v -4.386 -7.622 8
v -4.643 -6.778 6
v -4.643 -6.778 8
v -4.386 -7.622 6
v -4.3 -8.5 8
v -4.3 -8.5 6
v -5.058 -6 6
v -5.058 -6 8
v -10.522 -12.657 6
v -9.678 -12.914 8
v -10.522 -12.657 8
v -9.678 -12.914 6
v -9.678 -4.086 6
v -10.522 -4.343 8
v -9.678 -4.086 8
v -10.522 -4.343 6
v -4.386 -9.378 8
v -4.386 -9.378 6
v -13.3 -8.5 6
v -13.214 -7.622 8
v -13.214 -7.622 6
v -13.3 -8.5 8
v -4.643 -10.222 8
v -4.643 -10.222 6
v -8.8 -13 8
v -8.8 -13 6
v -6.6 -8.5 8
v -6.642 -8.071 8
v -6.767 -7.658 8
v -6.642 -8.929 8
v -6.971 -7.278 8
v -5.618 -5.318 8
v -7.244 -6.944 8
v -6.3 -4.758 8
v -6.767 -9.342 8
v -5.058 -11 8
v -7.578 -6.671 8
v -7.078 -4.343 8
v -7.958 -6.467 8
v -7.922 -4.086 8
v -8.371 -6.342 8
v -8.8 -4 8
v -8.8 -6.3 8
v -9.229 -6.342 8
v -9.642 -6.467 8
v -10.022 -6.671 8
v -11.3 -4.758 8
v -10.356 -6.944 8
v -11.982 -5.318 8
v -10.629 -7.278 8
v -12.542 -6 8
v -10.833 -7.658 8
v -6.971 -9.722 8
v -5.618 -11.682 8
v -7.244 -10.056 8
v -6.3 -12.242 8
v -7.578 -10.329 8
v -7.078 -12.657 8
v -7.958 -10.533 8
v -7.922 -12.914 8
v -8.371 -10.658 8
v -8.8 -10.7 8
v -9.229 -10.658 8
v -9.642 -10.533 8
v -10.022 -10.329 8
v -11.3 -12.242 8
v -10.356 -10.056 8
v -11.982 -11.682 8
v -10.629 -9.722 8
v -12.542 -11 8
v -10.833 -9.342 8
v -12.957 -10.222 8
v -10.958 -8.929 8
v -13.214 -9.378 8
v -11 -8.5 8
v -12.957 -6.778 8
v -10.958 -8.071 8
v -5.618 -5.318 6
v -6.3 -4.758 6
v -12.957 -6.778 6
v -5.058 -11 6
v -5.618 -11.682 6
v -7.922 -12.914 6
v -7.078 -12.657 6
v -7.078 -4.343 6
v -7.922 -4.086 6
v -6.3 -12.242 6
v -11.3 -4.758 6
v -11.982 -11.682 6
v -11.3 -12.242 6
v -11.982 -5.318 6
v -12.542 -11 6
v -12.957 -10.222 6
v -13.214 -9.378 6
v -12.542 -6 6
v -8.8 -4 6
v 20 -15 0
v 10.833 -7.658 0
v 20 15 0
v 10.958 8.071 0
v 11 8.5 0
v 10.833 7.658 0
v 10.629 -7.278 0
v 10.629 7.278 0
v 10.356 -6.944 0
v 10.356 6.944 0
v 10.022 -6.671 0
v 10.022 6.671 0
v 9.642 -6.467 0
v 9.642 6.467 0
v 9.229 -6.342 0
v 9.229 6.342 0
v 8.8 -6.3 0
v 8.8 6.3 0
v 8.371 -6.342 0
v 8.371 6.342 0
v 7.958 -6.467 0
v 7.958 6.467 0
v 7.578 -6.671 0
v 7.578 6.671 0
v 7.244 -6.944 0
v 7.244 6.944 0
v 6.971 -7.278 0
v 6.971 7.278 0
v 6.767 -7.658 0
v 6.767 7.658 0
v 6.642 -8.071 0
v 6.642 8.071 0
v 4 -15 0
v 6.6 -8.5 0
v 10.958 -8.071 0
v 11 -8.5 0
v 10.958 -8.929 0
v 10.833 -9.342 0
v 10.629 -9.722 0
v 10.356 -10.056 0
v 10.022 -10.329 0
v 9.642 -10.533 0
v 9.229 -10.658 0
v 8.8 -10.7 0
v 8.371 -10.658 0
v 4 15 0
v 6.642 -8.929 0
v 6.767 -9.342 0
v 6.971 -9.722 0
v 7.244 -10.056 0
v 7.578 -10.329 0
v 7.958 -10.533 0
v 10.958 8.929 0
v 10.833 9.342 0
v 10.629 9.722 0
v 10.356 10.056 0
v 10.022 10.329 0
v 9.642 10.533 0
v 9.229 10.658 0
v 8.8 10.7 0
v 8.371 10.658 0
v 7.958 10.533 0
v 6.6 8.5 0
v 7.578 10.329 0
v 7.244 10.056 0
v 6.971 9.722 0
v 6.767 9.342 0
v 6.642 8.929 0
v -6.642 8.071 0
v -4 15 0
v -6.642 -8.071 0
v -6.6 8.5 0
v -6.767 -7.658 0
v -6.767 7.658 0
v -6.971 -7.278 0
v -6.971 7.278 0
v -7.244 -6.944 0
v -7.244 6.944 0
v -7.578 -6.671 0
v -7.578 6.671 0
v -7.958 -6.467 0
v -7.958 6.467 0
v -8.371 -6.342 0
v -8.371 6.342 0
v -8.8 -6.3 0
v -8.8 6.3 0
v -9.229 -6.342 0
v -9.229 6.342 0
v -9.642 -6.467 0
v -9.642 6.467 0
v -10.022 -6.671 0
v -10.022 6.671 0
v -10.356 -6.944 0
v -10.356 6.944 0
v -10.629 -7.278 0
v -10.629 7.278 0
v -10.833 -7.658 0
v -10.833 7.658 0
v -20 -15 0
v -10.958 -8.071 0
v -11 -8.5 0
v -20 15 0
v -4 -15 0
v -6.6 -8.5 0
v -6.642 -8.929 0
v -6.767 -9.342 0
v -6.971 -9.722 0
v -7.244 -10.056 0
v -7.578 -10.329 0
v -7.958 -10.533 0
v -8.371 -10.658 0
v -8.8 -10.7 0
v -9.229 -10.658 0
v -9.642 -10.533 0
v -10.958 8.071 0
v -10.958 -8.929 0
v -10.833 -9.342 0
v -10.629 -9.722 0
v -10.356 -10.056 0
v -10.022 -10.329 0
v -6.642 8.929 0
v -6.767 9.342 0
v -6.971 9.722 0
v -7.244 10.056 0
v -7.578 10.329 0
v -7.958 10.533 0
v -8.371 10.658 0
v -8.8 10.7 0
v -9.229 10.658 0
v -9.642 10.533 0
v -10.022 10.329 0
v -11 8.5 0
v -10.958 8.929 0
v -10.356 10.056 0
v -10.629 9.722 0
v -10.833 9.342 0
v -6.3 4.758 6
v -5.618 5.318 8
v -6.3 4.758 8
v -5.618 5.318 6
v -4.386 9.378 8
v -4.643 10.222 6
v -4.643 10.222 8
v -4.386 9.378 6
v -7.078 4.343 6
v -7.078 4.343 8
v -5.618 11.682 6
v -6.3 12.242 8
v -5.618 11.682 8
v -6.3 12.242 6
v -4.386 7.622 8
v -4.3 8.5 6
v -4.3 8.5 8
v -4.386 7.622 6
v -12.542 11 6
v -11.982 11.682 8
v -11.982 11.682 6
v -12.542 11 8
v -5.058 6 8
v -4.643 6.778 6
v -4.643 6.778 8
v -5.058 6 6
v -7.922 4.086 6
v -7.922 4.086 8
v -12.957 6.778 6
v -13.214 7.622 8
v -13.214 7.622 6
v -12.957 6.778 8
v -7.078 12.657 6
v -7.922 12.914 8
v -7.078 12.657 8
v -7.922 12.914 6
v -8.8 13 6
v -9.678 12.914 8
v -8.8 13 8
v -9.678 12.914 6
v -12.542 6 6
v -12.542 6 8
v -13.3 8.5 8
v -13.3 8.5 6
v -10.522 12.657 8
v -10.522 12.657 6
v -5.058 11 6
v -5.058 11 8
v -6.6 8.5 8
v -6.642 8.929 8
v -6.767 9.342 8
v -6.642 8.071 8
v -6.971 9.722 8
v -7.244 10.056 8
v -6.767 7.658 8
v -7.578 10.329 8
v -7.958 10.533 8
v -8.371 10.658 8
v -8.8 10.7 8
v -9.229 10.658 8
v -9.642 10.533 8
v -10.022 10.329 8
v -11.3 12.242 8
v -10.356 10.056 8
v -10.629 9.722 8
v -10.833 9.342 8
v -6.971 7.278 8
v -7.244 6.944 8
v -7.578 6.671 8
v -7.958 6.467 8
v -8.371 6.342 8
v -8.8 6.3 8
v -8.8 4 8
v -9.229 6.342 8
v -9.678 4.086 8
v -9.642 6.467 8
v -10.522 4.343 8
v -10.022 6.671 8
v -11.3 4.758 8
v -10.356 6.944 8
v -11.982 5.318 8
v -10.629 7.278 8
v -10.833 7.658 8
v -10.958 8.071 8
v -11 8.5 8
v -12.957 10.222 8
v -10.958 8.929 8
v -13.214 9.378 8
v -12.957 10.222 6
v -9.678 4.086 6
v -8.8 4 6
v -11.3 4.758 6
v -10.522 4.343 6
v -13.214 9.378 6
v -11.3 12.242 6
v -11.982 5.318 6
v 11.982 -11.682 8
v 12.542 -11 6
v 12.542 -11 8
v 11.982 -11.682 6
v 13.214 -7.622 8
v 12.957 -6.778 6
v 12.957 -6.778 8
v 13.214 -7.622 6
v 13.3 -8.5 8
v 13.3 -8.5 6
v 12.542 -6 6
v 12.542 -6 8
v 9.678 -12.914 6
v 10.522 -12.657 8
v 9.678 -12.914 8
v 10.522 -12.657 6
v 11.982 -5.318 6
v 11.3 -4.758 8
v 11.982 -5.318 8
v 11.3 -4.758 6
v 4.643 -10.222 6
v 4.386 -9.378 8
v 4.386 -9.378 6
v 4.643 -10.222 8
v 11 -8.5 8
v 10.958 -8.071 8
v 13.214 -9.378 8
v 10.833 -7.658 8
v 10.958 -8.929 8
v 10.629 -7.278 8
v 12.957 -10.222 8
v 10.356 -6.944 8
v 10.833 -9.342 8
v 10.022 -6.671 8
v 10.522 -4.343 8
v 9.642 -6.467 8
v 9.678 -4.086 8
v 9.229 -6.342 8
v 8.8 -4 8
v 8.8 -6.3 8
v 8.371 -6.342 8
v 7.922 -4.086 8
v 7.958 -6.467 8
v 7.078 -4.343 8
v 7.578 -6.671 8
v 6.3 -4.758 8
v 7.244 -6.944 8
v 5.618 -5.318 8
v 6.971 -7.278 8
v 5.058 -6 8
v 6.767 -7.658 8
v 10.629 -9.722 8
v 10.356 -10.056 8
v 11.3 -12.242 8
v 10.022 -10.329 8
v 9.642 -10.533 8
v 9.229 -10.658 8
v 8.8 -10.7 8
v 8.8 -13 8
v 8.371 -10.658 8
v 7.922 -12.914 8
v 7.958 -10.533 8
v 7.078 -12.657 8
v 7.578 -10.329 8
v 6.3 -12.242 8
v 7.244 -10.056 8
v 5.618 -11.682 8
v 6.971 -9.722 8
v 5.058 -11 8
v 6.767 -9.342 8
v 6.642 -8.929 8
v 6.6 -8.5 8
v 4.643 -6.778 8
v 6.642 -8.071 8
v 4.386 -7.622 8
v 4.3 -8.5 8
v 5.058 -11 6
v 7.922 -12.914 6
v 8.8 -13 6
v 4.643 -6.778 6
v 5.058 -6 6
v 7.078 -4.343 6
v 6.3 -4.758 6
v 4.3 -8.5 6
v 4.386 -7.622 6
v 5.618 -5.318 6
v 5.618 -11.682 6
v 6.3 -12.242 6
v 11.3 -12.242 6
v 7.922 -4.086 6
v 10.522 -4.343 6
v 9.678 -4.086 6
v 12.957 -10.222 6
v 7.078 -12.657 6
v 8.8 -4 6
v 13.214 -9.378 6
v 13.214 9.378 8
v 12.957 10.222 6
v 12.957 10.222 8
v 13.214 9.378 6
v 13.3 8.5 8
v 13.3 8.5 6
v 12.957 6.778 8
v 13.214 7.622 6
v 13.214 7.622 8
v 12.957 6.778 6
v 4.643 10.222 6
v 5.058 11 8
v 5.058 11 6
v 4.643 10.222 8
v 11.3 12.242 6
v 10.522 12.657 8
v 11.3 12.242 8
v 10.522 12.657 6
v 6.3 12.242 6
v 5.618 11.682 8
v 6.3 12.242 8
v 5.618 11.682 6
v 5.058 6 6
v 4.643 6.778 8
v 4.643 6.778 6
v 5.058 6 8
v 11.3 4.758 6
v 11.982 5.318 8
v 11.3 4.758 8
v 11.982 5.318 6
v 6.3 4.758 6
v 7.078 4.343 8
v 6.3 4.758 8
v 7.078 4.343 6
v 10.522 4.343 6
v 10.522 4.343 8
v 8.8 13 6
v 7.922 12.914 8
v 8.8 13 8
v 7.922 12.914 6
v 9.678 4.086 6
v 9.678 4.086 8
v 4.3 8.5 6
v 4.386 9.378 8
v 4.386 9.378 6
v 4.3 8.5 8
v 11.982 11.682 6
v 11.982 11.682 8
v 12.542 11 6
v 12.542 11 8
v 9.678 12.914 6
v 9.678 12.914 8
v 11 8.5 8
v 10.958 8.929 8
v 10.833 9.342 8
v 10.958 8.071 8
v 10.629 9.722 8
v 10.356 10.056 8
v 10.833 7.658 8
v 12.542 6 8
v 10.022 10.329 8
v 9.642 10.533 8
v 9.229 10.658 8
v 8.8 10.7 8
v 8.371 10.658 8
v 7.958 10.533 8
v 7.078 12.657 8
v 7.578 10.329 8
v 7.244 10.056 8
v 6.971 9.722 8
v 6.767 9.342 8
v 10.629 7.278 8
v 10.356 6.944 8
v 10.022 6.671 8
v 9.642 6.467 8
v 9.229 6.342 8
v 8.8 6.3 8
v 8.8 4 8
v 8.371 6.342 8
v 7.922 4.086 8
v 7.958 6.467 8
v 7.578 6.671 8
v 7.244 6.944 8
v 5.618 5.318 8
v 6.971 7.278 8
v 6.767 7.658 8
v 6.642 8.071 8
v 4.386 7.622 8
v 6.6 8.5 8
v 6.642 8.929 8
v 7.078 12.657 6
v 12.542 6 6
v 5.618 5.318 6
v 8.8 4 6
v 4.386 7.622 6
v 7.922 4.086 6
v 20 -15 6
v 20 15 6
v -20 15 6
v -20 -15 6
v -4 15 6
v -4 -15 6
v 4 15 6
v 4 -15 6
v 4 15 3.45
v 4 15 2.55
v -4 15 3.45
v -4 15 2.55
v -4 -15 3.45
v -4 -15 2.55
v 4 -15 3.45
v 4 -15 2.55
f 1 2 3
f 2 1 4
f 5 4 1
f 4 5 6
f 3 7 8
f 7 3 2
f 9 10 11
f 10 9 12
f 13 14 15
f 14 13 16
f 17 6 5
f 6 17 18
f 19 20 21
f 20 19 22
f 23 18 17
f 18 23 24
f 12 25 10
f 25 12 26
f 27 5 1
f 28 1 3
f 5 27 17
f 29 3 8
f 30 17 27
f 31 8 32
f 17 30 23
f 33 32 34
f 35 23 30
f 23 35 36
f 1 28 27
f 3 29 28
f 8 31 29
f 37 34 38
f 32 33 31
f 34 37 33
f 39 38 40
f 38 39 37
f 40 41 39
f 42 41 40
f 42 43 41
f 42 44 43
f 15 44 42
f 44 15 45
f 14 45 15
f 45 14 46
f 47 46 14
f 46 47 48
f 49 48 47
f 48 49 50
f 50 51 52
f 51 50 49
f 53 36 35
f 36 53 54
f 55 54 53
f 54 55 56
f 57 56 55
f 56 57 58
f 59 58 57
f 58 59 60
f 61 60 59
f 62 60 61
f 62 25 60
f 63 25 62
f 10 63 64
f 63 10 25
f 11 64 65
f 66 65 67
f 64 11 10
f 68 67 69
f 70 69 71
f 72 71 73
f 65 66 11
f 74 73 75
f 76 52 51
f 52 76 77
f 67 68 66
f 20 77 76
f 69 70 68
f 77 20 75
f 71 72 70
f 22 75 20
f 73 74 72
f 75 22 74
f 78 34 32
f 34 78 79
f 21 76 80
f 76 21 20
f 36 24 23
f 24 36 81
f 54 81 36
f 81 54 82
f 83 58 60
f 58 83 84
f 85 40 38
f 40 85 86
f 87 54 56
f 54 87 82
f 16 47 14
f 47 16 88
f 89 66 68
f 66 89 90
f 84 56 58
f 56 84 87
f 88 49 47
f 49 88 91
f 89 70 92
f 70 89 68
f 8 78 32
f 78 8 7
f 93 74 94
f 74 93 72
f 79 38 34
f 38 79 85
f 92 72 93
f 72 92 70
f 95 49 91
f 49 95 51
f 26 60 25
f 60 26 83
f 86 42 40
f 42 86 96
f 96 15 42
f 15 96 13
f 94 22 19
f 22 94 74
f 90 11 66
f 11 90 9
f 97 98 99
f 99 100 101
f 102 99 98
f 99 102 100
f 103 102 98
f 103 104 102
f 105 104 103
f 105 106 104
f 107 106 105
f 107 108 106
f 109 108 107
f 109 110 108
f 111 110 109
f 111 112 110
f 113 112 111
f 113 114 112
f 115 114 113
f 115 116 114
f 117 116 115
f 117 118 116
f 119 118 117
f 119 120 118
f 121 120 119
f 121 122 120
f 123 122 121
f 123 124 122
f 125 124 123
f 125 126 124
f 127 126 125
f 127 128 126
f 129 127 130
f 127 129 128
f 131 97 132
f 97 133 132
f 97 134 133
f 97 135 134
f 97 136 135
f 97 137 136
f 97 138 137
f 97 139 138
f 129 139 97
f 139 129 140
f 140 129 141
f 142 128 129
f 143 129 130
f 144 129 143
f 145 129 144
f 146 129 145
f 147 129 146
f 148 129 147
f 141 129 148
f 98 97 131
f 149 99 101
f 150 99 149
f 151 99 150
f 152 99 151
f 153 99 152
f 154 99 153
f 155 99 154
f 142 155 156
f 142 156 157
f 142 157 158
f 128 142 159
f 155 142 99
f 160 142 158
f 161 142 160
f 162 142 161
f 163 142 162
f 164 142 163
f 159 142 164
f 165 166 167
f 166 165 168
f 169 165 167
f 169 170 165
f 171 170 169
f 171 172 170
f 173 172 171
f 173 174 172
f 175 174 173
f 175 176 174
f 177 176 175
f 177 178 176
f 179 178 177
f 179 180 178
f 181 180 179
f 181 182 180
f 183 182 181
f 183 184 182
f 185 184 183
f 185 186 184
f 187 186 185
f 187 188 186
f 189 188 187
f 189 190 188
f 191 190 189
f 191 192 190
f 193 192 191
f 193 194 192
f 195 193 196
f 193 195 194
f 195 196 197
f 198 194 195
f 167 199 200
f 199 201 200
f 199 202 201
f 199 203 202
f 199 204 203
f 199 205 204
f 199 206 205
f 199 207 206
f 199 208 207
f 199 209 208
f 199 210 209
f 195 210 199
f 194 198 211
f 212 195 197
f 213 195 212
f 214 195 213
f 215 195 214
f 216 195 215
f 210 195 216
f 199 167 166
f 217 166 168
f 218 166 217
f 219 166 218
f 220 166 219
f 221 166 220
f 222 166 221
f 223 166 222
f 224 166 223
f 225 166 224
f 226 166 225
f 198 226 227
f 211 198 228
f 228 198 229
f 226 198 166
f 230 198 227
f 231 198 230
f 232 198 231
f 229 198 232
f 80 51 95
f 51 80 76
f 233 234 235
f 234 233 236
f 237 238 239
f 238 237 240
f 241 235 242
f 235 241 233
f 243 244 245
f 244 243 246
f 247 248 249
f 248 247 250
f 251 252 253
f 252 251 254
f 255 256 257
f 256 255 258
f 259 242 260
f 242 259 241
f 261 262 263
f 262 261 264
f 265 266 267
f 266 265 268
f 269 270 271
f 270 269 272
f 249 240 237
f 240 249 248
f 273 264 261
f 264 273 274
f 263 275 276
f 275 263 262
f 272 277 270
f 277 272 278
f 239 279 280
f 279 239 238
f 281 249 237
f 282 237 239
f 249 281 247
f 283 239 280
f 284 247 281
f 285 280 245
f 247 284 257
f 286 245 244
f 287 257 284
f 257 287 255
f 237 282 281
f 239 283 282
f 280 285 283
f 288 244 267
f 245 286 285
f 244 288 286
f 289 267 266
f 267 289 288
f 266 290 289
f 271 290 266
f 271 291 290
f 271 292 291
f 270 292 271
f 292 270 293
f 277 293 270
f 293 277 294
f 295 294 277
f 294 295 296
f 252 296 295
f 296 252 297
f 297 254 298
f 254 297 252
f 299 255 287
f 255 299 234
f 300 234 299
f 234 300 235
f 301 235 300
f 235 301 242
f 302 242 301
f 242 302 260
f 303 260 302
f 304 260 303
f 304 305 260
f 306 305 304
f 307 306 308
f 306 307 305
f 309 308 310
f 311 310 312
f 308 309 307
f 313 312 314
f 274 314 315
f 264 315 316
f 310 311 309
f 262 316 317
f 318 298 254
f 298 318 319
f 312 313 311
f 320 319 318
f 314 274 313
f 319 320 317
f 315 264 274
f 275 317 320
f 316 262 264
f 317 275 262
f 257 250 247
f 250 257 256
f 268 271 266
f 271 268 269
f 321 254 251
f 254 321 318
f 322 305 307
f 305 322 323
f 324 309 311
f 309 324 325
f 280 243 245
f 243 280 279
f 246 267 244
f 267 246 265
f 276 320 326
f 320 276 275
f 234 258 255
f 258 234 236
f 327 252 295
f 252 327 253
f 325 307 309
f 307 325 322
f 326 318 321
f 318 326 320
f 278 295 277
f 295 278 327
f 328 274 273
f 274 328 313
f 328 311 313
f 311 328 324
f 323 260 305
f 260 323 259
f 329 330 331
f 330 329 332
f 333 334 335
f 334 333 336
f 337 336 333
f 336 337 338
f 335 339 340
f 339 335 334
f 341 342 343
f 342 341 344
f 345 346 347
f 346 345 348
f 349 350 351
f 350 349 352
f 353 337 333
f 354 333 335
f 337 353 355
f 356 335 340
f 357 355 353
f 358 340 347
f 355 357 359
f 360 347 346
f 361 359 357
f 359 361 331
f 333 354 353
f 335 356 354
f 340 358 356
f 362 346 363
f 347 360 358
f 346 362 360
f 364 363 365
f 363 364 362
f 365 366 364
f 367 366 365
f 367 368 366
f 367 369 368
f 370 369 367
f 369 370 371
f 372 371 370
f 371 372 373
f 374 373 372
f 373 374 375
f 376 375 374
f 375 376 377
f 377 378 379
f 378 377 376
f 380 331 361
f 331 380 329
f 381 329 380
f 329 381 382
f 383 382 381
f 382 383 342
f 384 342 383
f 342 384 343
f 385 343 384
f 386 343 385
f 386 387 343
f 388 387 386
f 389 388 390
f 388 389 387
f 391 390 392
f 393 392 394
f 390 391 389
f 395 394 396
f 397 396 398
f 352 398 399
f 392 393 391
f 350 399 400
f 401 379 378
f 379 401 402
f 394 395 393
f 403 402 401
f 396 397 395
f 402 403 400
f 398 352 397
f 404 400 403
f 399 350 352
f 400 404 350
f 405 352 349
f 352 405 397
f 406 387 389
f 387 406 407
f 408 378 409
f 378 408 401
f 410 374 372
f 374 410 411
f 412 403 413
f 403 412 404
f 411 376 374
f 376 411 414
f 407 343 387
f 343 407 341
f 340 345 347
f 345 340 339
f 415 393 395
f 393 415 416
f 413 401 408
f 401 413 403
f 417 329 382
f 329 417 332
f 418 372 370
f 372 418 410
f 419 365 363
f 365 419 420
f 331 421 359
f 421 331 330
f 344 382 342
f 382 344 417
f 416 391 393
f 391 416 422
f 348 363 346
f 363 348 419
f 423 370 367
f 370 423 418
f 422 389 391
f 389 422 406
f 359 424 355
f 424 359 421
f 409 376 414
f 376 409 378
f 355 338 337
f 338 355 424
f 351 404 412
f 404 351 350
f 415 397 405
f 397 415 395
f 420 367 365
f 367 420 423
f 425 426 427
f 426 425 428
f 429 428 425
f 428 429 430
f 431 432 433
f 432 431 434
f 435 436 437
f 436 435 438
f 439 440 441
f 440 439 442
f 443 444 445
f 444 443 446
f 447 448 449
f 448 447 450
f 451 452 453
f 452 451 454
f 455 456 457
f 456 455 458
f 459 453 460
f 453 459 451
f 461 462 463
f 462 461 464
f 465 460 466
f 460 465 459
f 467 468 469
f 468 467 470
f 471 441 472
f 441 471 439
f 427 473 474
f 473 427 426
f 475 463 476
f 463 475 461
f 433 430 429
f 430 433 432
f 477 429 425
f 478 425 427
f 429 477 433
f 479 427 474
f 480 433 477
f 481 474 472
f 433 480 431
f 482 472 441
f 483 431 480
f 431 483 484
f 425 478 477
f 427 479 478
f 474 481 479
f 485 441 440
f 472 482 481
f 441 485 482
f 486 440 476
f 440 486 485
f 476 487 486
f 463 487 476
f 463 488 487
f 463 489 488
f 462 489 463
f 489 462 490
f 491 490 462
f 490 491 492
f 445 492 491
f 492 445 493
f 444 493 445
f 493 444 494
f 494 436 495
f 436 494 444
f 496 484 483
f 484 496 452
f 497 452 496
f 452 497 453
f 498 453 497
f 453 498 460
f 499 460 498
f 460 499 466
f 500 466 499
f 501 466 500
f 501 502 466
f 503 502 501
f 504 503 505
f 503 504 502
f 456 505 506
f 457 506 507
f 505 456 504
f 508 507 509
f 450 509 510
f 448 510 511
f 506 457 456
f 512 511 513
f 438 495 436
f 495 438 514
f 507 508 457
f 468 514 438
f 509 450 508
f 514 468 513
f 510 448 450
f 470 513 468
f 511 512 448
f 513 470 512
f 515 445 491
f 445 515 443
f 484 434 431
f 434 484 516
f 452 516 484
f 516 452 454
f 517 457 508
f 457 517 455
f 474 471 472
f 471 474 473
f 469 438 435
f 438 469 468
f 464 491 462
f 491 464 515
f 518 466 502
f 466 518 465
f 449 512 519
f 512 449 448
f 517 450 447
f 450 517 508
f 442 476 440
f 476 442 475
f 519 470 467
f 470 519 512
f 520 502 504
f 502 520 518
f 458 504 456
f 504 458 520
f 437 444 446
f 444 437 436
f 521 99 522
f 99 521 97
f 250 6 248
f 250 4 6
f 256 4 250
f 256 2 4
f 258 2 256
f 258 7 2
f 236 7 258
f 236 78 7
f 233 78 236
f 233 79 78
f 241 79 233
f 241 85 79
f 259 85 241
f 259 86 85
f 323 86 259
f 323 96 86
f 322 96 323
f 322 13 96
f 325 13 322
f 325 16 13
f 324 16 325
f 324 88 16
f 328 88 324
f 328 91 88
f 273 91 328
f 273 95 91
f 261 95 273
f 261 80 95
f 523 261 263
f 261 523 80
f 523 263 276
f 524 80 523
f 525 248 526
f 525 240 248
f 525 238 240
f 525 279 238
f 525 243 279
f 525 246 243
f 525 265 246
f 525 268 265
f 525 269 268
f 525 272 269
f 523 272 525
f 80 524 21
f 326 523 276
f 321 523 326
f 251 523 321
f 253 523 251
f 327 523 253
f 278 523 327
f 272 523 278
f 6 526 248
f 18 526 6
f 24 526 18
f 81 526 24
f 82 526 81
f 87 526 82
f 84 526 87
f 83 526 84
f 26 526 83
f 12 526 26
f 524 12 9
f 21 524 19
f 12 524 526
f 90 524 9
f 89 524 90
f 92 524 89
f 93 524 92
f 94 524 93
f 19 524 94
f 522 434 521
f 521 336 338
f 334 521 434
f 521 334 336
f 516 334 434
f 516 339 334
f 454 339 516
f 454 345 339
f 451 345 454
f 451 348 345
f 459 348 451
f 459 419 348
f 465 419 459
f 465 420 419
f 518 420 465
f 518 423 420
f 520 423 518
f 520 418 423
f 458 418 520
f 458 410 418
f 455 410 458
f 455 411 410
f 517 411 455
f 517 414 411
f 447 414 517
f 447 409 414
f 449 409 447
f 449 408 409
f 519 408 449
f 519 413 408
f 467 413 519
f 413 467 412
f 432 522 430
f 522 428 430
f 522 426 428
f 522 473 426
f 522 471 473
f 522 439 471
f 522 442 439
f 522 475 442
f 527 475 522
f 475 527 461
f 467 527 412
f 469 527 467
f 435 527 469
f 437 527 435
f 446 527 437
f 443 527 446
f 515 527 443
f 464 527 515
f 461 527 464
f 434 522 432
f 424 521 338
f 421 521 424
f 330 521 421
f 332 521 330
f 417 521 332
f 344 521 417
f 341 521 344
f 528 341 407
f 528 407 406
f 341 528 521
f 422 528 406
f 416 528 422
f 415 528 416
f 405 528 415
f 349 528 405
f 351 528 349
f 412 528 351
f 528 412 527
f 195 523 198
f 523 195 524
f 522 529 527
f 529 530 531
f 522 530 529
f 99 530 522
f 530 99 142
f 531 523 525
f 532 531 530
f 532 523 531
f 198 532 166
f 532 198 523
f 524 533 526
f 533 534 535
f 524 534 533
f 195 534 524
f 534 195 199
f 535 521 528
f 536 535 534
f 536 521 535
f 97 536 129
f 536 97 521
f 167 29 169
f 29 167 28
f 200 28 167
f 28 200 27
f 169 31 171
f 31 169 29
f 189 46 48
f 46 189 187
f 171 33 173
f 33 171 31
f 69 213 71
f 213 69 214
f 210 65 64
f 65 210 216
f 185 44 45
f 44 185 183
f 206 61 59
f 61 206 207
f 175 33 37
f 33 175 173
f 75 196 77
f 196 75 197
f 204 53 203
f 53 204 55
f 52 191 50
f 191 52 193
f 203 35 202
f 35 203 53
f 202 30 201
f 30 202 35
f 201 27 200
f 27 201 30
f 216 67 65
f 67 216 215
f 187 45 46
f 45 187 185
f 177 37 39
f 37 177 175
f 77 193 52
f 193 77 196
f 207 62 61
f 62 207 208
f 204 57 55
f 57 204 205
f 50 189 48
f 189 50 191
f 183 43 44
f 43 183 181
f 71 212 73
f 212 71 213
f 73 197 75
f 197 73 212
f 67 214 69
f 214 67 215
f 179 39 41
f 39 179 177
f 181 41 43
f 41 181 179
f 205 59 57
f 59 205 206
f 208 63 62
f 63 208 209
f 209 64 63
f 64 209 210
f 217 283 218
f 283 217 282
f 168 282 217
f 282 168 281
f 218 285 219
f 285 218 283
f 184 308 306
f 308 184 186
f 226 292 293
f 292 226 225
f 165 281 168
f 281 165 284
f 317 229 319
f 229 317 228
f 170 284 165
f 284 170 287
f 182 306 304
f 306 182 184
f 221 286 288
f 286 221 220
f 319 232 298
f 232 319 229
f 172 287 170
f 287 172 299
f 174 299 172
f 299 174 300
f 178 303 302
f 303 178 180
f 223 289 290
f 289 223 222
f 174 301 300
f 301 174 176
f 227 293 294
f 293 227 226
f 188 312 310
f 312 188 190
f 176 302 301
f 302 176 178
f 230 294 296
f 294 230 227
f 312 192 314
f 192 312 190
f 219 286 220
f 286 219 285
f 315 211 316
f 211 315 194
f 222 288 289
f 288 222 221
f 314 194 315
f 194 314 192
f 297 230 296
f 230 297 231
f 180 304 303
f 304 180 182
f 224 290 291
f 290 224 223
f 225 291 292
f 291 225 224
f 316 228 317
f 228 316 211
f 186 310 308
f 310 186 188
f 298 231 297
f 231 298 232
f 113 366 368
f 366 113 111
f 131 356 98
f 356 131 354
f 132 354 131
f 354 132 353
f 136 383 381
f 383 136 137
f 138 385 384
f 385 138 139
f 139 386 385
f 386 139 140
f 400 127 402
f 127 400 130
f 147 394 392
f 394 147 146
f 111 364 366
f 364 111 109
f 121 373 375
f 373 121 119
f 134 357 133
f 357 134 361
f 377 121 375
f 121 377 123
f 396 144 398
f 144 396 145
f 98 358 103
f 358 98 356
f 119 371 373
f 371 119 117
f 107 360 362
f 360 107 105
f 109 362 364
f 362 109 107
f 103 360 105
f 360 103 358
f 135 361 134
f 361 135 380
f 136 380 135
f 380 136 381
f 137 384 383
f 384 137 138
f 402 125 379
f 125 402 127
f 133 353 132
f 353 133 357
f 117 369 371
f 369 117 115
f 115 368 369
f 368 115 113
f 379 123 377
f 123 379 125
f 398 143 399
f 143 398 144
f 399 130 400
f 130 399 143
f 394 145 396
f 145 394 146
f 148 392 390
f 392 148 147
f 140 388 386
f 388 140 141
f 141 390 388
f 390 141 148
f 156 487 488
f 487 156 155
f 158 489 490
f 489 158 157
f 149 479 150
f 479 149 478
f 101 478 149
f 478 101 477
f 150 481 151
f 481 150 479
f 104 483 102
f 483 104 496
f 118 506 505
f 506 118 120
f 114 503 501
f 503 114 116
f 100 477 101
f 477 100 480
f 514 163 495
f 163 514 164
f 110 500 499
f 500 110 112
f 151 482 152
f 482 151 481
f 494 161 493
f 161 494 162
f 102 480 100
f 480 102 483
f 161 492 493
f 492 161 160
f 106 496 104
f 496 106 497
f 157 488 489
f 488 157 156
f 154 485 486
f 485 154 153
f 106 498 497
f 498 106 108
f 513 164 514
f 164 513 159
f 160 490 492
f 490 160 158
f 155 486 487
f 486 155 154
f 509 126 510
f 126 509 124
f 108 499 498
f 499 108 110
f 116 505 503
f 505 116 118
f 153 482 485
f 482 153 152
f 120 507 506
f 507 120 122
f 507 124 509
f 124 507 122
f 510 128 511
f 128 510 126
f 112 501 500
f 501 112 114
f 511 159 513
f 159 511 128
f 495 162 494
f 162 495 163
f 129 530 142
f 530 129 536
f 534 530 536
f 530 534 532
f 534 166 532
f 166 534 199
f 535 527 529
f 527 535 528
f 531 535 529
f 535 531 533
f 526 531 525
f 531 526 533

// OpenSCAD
$fn = 32;

// ----------------------------------------------------------------------
// Living hinge: 40 x 30 mm plates, 0.9 mm flexible web
// ----------------------------------------------------------------------

// --- parameters (mm) ---
plate_len = 16;           // plate length outside the web
plate_w = 30;             // plate width
thick = 6;                // plate thickness
web_half = 4;             // half width of the flex band
web_t = 0.9;              // flexible web thickness
web_z = 2.55;             // web position inside the thickness
boss_d = 9;               // screw boss diameter
boss_h = 8;               // screw boss height
boss_x = 8.8;             // screw boss distance from the web
screw_d = 4.4;            // screw hole

difference() {
  union() {
    /* one flat strip, later thinned at the middle */
    translate([-20, -15, 0]) cube([40, 30, 6]);
    /* screw bosses, sunk 0.5 mm into the plates */
    for (sx = [-8.8, 8.8]) {
      for (sy = [-8.5, 8.5]) {
        translate([sx, sy, 0]) cylinder(h = boss_h, d = boss_d);
      }
    }
  }
  /* channel from below: leaves the web on top of it */
  translate([-4, -17.5, -2.5]) cube([8, 35, 5.05]);
  /* channel from above: thins the web down to web_t */
  translate([-4, -17.5, 3.45]) cube([8, 35, 5.05]);
  /* screw holes through the bosses */
  for (sx = [-8.8, 8.8]) {
    for (sy = [-8.5, 8.5]) {
      translate([sx, sy, -2.5]) cylinder(h = boss_h + 5, d = screw_d);
    }
  }
}
